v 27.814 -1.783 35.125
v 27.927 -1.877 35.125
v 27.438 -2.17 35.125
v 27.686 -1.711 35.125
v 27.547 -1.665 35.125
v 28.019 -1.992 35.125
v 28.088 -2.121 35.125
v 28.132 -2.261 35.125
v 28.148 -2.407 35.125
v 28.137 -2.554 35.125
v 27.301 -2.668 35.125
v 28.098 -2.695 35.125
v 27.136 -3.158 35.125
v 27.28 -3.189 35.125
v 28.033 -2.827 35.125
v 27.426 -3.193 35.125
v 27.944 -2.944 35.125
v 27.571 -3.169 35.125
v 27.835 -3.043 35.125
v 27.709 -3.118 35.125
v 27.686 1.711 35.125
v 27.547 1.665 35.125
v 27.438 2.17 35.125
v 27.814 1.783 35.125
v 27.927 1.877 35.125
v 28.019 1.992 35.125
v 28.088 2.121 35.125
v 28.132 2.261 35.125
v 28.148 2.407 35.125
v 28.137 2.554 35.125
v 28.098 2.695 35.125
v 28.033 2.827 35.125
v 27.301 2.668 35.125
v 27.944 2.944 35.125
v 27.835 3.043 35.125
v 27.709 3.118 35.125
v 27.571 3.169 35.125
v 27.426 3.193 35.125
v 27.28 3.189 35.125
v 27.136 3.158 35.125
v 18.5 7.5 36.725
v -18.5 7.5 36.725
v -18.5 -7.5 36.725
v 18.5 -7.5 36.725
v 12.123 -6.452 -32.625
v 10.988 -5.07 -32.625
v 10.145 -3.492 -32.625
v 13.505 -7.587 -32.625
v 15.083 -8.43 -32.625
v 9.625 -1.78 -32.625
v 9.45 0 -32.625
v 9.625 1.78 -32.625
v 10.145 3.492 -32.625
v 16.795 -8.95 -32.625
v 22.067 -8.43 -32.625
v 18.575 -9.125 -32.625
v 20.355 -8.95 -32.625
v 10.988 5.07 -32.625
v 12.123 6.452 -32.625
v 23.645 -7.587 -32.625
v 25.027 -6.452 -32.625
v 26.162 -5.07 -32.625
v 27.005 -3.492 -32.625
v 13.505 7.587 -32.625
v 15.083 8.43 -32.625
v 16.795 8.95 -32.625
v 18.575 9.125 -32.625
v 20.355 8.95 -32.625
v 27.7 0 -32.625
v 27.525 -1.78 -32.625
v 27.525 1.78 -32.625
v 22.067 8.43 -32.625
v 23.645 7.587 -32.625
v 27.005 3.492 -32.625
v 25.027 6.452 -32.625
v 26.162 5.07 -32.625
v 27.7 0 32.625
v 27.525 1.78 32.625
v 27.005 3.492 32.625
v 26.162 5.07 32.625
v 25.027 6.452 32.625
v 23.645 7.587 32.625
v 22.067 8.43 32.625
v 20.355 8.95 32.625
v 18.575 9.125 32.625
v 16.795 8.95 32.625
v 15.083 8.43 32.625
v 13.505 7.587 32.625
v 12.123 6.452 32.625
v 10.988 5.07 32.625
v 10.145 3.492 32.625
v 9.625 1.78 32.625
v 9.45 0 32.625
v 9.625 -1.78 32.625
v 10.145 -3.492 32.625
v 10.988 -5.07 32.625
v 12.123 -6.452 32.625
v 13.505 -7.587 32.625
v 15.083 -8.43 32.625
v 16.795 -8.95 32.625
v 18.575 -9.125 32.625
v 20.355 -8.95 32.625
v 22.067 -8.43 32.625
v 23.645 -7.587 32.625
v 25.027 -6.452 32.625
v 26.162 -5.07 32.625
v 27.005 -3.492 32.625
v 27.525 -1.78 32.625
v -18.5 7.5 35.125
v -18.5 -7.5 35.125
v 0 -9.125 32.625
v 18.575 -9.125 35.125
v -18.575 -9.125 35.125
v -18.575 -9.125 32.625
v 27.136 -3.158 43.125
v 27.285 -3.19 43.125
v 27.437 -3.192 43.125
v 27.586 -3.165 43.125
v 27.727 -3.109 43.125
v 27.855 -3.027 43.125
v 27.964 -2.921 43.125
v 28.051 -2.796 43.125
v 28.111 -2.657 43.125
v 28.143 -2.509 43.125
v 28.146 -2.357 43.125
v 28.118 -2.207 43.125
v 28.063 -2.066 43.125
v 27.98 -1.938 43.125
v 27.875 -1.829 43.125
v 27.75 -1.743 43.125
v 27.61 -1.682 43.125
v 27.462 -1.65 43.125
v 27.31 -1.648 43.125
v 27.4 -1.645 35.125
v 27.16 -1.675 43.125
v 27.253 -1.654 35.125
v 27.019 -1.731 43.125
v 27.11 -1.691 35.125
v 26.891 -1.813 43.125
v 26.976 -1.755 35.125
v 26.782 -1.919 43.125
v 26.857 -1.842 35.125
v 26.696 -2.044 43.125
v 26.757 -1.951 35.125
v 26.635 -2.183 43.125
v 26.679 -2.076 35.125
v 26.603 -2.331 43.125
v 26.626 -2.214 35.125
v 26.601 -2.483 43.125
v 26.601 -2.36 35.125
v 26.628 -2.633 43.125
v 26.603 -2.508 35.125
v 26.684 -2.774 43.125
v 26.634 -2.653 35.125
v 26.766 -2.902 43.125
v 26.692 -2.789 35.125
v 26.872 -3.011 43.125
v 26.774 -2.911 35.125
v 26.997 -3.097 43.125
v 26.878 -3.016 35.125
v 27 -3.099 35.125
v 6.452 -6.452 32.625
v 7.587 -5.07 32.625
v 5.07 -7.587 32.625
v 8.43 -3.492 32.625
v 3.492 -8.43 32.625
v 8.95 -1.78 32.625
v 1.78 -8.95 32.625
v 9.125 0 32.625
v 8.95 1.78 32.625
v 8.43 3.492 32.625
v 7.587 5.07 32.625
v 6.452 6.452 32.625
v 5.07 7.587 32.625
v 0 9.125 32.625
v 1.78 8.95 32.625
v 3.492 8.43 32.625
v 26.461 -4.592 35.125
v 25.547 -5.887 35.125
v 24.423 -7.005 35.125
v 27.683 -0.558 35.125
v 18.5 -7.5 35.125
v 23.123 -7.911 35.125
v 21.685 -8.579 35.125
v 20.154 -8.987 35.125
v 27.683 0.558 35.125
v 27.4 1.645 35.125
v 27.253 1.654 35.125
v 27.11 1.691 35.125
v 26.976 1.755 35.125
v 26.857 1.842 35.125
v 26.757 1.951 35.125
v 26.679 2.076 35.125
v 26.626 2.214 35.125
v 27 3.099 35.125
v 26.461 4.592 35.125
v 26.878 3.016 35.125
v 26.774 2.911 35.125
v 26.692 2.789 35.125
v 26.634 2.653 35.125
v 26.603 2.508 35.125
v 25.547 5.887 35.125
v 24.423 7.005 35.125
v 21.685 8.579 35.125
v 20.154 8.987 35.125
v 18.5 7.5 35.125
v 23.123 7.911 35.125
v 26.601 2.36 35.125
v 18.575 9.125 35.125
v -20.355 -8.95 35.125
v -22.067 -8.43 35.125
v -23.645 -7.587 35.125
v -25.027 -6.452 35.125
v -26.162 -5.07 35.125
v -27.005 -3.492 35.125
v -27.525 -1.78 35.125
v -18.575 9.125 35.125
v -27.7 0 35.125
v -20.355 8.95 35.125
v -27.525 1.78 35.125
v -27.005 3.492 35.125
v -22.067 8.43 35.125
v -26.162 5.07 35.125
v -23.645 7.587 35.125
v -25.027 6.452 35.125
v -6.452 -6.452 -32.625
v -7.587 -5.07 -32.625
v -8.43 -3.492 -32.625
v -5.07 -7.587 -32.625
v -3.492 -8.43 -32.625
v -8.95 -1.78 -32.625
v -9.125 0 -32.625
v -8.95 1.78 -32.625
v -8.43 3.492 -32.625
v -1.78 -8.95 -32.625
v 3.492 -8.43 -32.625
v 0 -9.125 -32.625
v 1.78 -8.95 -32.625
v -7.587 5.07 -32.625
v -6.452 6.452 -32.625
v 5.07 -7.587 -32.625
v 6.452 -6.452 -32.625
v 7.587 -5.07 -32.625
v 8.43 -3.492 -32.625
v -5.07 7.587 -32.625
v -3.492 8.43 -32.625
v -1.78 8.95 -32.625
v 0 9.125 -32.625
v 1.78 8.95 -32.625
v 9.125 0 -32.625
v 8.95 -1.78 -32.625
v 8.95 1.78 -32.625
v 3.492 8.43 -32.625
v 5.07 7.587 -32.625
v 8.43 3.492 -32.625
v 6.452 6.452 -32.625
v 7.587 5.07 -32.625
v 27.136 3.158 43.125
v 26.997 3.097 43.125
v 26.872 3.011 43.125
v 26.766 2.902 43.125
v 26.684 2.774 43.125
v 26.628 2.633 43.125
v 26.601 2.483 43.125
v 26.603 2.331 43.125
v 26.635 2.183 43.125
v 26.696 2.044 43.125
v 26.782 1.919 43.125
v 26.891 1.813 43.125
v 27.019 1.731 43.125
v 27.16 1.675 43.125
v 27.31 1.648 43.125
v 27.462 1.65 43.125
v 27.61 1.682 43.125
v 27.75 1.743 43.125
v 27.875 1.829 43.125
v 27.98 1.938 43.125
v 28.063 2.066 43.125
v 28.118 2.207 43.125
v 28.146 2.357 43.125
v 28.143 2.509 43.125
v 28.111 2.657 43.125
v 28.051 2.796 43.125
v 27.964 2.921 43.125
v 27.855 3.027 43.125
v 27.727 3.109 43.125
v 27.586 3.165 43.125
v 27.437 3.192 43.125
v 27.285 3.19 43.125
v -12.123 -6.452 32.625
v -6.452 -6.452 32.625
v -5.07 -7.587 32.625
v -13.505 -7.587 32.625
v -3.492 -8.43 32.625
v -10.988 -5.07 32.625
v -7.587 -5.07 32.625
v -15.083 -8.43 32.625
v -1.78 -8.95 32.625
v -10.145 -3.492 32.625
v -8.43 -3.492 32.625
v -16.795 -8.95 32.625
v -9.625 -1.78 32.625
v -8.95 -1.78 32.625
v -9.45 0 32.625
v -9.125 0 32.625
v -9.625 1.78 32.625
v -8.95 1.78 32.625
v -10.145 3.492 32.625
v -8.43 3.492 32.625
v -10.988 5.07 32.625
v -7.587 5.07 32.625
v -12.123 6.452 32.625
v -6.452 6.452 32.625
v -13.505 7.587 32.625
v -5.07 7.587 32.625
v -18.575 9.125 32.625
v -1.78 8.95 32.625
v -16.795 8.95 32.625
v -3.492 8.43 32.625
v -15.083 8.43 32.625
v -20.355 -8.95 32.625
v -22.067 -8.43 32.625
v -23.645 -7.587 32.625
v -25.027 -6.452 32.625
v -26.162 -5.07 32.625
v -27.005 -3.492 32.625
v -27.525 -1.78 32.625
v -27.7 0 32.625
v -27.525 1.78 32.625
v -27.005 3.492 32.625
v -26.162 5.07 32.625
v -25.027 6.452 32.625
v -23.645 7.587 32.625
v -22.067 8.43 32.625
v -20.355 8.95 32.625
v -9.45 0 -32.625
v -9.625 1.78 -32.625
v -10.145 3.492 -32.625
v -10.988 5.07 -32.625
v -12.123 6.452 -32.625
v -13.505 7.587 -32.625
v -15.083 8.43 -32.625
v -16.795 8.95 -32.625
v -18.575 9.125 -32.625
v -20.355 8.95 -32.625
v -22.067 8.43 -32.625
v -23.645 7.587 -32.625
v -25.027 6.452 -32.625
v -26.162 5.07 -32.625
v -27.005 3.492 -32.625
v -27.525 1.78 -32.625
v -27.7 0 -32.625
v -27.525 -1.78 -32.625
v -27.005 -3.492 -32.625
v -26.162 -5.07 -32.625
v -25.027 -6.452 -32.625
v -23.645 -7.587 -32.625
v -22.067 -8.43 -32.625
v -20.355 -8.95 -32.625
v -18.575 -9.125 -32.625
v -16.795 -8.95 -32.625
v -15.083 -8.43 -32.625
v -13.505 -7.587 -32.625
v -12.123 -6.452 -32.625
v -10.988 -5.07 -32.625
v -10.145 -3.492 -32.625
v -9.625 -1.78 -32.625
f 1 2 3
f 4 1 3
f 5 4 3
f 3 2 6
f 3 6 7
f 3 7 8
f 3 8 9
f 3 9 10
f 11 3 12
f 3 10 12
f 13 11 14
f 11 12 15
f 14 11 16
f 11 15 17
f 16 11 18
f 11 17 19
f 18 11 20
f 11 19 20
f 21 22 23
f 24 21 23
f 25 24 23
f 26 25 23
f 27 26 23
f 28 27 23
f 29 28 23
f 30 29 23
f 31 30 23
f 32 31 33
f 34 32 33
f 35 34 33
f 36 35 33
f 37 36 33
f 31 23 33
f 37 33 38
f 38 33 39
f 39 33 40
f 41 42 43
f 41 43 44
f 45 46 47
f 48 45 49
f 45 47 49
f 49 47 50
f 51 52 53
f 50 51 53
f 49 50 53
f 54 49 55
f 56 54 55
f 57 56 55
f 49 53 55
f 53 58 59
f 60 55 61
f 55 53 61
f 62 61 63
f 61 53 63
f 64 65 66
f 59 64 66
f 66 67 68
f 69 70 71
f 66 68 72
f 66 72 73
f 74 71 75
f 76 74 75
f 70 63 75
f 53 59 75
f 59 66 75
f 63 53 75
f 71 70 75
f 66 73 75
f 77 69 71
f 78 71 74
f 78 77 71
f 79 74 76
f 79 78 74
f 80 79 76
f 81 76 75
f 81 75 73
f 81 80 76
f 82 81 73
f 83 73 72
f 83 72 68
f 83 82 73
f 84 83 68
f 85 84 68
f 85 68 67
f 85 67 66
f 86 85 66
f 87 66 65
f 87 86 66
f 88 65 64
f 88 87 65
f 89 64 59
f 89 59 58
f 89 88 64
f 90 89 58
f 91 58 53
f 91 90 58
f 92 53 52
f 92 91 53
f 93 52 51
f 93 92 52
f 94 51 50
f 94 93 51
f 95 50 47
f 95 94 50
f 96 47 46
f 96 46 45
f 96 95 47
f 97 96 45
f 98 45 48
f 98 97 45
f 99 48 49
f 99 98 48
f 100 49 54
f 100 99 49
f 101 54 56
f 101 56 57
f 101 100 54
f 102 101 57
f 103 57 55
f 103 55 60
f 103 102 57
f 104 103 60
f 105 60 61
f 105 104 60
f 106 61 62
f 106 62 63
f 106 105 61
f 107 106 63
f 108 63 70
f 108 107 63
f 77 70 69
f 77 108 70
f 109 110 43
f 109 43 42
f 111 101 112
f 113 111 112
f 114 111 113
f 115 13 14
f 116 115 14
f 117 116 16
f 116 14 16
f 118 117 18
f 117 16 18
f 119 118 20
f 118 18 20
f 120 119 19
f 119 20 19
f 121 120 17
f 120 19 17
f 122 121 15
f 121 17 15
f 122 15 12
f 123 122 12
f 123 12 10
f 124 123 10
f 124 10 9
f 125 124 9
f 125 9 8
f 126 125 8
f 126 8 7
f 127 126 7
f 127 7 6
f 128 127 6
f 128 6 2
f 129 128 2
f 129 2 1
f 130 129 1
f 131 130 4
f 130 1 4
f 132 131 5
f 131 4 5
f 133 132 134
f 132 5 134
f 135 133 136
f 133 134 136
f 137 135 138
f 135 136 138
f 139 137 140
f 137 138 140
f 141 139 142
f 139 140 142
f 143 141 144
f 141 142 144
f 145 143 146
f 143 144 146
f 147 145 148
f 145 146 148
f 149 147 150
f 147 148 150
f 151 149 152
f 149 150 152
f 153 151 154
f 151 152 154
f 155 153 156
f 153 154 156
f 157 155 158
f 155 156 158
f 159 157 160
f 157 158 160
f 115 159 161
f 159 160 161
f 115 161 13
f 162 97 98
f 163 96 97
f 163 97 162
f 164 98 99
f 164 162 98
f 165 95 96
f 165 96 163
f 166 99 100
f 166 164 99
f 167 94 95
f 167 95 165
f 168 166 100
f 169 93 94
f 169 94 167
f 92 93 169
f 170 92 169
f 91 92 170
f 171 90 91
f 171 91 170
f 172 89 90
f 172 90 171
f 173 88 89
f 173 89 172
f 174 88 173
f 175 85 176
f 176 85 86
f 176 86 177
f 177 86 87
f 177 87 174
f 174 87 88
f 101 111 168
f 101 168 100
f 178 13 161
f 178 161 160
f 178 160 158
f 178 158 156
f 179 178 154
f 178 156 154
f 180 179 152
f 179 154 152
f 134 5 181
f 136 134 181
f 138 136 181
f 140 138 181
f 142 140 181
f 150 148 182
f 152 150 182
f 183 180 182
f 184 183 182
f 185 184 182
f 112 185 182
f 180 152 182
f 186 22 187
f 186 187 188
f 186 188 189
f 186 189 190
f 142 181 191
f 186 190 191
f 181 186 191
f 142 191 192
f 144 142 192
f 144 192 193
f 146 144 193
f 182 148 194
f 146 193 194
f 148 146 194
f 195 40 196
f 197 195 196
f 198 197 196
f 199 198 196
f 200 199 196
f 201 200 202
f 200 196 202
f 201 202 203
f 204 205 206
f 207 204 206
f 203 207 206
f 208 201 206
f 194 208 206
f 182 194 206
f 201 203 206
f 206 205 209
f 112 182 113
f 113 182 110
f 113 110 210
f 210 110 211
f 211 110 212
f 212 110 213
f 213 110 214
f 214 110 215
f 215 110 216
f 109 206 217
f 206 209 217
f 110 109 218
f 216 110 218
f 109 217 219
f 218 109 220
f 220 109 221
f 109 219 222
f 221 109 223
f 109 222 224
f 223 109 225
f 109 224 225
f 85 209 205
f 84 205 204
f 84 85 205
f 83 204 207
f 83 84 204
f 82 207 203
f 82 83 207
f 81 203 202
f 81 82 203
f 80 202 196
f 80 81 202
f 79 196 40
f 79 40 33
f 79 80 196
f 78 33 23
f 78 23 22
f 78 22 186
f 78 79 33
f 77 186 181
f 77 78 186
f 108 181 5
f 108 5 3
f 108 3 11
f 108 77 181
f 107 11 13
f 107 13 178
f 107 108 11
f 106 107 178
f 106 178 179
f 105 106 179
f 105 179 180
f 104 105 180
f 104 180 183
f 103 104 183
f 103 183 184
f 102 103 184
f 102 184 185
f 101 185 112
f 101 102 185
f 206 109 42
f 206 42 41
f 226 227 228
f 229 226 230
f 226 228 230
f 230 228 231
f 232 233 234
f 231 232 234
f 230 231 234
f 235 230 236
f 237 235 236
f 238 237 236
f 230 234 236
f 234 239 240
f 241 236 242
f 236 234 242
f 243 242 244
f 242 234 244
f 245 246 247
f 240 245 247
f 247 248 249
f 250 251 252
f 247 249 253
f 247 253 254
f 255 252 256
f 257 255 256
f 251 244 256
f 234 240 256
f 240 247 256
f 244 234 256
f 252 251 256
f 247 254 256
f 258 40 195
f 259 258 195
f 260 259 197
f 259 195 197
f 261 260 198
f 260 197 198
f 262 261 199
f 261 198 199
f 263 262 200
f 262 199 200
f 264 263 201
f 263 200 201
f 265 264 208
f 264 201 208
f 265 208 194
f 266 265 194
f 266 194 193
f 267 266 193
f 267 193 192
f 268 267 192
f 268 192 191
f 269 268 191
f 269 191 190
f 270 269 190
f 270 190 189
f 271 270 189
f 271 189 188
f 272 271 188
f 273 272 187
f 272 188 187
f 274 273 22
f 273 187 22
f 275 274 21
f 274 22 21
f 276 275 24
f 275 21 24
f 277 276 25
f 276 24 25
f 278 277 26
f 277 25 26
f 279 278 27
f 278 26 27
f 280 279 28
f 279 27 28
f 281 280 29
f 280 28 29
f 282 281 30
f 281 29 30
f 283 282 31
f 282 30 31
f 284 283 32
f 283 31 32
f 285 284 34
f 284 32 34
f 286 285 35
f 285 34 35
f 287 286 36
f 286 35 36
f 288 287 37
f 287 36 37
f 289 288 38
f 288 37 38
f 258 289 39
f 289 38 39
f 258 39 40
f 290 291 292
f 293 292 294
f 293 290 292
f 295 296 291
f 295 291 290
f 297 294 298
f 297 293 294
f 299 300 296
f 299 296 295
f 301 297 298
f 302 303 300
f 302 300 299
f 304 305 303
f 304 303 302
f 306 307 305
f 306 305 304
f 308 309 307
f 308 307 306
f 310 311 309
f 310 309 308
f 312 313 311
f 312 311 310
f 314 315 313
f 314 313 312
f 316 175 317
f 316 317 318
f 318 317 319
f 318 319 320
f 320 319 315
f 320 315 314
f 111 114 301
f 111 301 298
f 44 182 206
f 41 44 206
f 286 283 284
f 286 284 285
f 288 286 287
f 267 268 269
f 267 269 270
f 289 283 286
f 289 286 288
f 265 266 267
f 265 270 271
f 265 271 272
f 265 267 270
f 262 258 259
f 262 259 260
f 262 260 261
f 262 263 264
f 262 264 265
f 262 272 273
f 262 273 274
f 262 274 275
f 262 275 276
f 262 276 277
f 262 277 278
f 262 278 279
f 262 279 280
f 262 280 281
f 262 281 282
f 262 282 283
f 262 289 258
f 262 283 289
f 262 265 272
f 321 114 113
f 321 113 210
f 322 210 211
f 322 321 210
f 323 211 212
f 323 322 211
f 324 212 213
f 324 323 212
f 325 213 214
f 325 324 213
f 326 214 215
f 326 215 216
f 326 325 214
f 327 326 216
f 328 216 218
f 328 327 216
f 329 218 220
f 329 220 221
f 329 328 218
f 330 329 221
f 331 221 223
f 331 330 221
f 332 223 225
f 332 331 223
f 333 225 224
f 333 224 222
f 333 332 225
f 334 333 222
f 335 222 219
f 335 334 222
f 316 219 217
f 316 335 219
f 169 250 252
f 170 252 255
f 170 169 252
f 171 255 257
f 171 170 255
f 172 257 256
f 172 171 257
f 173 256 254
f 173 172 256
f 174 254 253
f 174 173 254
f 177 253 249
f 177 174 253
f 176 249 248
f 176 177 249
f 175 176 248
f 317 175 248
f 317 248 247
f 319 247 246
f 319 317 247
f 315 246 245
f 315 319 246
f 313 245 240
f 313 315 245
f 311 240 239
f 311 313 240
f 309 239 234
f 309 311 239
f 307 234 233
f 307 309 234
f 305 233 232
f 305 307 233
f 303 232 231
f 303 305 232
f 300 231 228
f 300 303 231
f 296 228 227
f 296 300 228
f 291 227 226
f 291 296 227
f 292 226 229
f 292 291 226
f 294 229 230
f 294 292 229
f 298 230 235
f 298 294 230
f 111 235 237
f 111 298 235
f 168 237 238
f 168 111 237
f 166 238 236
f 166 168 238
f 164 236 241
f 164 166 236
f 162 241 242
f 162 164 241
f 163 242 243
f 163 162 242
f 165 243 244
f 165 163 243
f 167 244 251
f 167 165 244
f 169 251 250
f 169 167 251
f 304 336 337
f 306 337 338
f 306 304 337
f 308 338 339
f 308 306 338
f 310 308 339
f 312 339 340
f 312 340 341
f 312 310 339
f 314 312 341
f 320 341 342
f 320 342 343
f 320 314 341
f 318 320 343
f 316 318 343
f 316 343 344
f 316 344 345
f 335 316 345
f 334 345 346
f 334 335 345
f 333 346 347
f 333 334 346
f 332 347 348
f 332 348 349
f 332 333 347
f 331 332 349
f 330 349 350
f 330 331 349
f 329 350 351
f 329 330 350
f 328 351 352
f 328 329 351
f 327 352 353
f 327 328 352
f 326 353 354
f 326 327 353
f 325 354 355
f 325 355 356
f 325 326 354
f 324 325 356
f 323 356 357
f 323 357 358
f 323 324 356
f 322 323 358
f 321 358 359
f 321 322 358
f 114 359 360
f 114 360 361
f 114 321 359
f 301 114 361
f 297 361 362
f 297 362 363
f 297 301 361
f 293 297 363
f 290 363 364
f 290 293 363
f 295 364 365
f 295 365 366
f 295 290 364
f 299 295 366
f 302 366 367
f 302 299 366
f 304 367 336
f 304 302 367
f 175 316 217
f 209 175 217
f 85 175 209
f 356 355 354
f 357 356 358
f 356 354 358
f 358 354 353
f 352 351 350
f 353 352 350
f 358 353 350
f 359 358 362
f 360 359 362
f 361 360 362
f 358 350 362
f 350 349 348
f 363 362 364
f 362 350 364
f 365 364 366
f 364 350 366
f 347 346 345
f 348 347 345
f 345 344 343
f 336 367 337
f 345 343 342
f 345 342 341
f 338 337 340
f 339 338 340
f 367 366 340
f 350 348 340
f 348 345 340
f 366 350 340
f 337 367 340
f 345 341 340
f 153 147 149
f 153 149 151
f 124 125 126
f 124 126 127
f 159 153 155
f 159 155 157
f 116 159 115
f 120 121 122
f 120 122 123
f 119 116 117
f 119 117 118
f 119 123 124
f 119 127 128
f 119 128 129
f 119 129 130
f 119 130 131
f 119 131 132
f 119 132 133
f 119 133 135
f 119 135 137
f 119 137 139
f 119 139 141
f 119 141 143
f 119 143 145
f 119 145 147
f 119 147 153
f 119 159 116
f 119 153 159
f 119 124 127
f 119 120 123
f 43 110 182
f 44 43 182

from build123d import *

# Parameters (mm, degrees)
SKETCH1_R             = 9.125
BOSS_EXTRUDE1_DEPTH   = 32.625
BOSS_EXTRUDE1_2_DEPTH = 32.625
BOSS_EXTRUDE1_3_DEPTH = 32.625
BOSS_EXTRUDE2_DEPTH   = 2.5
SKETCH3_W             = 37
SKETCH3_H             = 15
BOSS_EXTRUDE3_DEPTH   = 1.6
SKETCH4_R             = 0.775
BOSS_EXTRUDE4_DEPTH   = 8


with BuildPart() as part:
    # Sketch1 → Boss-Extrude1 (new, symmetric)
    with BuildSketch(Plane.XY):
        Circle(SKETCH1_R)
    extrude(amount=BOSS_EXTRUDE1_DEPTH, both=True)



with BuildPart() as body_2:
    # Sketch1 → Boss-Extrude1 2 (new, symmetric)
    with BuildSketch(Plane.XY):
        with Locations((18.575, 0)):
            Circle(SKETCH1_R)
    extrude(amount=BOSS_EXTRUDE1_2_DEPTH, both=True)


with BuildPart() as body_3:
    # Sketch1 → Boss-Extrude1 3 (new, symmetric)
    with BuildSketch(Plane.XY):
        with Locations((-18.575, 0)):
            Circle(SKETCH1_R)
    extrude(amount=BOSS_EXTRUDE1_3_DEPTH, both=True)


with BuildPart() as part_1:
    add(part.part)

    add(body_2.part)  # Boss-Extrude2 merges body 2

    add(body_3.part)  # Boss-Extrude2 merges body 3
    # Sketch2 → Boss-Extrude2 (add)
    with BuildSketch(Plane.XY.offset(32.625)):
        with BuildLine():
            Line((-18.575, 9.125), (18.575, 9.125))
            ThreePointArc((18.575, 9.125), (27.7, 0), (18.575, -9.125))
            Line((18.575, -9.125), (-18.575, -9.125))
            ThreePointArc((-18.575, -9.125), (-27.7, 0), (-18.575, 9.125))
        make_face()
    extrude(amount=BOSS_EXTRUDE2_DEPTH)

    # Sketch3 → Boss-Extrude3 (add)
    with BuildSketch(Plane.XY.offset(35.125)):
        Rectangle(SKETCH3_W, SKETCH3_H)
    extrude(amount=BOSS_EXTRUDE3_DEPTH)

    # Sketch4 → Boss-Extrude4 (add)
    with BuildSketch(Plane.XY.offset(35.125)):
        with Locations(Location((27.373251247, 2.42, 0), (0, 0, 107.8130031))):
            Circle(SKETCH4_R)
        with Locations(Location((27.373251247, -2.42, 0), (0, 0, 252.1869969))):
            Circle(SKETCH4_R)
    extrude(amount=BOSS_EXTRUDE4_DEPTH)


solid = part_1.part
